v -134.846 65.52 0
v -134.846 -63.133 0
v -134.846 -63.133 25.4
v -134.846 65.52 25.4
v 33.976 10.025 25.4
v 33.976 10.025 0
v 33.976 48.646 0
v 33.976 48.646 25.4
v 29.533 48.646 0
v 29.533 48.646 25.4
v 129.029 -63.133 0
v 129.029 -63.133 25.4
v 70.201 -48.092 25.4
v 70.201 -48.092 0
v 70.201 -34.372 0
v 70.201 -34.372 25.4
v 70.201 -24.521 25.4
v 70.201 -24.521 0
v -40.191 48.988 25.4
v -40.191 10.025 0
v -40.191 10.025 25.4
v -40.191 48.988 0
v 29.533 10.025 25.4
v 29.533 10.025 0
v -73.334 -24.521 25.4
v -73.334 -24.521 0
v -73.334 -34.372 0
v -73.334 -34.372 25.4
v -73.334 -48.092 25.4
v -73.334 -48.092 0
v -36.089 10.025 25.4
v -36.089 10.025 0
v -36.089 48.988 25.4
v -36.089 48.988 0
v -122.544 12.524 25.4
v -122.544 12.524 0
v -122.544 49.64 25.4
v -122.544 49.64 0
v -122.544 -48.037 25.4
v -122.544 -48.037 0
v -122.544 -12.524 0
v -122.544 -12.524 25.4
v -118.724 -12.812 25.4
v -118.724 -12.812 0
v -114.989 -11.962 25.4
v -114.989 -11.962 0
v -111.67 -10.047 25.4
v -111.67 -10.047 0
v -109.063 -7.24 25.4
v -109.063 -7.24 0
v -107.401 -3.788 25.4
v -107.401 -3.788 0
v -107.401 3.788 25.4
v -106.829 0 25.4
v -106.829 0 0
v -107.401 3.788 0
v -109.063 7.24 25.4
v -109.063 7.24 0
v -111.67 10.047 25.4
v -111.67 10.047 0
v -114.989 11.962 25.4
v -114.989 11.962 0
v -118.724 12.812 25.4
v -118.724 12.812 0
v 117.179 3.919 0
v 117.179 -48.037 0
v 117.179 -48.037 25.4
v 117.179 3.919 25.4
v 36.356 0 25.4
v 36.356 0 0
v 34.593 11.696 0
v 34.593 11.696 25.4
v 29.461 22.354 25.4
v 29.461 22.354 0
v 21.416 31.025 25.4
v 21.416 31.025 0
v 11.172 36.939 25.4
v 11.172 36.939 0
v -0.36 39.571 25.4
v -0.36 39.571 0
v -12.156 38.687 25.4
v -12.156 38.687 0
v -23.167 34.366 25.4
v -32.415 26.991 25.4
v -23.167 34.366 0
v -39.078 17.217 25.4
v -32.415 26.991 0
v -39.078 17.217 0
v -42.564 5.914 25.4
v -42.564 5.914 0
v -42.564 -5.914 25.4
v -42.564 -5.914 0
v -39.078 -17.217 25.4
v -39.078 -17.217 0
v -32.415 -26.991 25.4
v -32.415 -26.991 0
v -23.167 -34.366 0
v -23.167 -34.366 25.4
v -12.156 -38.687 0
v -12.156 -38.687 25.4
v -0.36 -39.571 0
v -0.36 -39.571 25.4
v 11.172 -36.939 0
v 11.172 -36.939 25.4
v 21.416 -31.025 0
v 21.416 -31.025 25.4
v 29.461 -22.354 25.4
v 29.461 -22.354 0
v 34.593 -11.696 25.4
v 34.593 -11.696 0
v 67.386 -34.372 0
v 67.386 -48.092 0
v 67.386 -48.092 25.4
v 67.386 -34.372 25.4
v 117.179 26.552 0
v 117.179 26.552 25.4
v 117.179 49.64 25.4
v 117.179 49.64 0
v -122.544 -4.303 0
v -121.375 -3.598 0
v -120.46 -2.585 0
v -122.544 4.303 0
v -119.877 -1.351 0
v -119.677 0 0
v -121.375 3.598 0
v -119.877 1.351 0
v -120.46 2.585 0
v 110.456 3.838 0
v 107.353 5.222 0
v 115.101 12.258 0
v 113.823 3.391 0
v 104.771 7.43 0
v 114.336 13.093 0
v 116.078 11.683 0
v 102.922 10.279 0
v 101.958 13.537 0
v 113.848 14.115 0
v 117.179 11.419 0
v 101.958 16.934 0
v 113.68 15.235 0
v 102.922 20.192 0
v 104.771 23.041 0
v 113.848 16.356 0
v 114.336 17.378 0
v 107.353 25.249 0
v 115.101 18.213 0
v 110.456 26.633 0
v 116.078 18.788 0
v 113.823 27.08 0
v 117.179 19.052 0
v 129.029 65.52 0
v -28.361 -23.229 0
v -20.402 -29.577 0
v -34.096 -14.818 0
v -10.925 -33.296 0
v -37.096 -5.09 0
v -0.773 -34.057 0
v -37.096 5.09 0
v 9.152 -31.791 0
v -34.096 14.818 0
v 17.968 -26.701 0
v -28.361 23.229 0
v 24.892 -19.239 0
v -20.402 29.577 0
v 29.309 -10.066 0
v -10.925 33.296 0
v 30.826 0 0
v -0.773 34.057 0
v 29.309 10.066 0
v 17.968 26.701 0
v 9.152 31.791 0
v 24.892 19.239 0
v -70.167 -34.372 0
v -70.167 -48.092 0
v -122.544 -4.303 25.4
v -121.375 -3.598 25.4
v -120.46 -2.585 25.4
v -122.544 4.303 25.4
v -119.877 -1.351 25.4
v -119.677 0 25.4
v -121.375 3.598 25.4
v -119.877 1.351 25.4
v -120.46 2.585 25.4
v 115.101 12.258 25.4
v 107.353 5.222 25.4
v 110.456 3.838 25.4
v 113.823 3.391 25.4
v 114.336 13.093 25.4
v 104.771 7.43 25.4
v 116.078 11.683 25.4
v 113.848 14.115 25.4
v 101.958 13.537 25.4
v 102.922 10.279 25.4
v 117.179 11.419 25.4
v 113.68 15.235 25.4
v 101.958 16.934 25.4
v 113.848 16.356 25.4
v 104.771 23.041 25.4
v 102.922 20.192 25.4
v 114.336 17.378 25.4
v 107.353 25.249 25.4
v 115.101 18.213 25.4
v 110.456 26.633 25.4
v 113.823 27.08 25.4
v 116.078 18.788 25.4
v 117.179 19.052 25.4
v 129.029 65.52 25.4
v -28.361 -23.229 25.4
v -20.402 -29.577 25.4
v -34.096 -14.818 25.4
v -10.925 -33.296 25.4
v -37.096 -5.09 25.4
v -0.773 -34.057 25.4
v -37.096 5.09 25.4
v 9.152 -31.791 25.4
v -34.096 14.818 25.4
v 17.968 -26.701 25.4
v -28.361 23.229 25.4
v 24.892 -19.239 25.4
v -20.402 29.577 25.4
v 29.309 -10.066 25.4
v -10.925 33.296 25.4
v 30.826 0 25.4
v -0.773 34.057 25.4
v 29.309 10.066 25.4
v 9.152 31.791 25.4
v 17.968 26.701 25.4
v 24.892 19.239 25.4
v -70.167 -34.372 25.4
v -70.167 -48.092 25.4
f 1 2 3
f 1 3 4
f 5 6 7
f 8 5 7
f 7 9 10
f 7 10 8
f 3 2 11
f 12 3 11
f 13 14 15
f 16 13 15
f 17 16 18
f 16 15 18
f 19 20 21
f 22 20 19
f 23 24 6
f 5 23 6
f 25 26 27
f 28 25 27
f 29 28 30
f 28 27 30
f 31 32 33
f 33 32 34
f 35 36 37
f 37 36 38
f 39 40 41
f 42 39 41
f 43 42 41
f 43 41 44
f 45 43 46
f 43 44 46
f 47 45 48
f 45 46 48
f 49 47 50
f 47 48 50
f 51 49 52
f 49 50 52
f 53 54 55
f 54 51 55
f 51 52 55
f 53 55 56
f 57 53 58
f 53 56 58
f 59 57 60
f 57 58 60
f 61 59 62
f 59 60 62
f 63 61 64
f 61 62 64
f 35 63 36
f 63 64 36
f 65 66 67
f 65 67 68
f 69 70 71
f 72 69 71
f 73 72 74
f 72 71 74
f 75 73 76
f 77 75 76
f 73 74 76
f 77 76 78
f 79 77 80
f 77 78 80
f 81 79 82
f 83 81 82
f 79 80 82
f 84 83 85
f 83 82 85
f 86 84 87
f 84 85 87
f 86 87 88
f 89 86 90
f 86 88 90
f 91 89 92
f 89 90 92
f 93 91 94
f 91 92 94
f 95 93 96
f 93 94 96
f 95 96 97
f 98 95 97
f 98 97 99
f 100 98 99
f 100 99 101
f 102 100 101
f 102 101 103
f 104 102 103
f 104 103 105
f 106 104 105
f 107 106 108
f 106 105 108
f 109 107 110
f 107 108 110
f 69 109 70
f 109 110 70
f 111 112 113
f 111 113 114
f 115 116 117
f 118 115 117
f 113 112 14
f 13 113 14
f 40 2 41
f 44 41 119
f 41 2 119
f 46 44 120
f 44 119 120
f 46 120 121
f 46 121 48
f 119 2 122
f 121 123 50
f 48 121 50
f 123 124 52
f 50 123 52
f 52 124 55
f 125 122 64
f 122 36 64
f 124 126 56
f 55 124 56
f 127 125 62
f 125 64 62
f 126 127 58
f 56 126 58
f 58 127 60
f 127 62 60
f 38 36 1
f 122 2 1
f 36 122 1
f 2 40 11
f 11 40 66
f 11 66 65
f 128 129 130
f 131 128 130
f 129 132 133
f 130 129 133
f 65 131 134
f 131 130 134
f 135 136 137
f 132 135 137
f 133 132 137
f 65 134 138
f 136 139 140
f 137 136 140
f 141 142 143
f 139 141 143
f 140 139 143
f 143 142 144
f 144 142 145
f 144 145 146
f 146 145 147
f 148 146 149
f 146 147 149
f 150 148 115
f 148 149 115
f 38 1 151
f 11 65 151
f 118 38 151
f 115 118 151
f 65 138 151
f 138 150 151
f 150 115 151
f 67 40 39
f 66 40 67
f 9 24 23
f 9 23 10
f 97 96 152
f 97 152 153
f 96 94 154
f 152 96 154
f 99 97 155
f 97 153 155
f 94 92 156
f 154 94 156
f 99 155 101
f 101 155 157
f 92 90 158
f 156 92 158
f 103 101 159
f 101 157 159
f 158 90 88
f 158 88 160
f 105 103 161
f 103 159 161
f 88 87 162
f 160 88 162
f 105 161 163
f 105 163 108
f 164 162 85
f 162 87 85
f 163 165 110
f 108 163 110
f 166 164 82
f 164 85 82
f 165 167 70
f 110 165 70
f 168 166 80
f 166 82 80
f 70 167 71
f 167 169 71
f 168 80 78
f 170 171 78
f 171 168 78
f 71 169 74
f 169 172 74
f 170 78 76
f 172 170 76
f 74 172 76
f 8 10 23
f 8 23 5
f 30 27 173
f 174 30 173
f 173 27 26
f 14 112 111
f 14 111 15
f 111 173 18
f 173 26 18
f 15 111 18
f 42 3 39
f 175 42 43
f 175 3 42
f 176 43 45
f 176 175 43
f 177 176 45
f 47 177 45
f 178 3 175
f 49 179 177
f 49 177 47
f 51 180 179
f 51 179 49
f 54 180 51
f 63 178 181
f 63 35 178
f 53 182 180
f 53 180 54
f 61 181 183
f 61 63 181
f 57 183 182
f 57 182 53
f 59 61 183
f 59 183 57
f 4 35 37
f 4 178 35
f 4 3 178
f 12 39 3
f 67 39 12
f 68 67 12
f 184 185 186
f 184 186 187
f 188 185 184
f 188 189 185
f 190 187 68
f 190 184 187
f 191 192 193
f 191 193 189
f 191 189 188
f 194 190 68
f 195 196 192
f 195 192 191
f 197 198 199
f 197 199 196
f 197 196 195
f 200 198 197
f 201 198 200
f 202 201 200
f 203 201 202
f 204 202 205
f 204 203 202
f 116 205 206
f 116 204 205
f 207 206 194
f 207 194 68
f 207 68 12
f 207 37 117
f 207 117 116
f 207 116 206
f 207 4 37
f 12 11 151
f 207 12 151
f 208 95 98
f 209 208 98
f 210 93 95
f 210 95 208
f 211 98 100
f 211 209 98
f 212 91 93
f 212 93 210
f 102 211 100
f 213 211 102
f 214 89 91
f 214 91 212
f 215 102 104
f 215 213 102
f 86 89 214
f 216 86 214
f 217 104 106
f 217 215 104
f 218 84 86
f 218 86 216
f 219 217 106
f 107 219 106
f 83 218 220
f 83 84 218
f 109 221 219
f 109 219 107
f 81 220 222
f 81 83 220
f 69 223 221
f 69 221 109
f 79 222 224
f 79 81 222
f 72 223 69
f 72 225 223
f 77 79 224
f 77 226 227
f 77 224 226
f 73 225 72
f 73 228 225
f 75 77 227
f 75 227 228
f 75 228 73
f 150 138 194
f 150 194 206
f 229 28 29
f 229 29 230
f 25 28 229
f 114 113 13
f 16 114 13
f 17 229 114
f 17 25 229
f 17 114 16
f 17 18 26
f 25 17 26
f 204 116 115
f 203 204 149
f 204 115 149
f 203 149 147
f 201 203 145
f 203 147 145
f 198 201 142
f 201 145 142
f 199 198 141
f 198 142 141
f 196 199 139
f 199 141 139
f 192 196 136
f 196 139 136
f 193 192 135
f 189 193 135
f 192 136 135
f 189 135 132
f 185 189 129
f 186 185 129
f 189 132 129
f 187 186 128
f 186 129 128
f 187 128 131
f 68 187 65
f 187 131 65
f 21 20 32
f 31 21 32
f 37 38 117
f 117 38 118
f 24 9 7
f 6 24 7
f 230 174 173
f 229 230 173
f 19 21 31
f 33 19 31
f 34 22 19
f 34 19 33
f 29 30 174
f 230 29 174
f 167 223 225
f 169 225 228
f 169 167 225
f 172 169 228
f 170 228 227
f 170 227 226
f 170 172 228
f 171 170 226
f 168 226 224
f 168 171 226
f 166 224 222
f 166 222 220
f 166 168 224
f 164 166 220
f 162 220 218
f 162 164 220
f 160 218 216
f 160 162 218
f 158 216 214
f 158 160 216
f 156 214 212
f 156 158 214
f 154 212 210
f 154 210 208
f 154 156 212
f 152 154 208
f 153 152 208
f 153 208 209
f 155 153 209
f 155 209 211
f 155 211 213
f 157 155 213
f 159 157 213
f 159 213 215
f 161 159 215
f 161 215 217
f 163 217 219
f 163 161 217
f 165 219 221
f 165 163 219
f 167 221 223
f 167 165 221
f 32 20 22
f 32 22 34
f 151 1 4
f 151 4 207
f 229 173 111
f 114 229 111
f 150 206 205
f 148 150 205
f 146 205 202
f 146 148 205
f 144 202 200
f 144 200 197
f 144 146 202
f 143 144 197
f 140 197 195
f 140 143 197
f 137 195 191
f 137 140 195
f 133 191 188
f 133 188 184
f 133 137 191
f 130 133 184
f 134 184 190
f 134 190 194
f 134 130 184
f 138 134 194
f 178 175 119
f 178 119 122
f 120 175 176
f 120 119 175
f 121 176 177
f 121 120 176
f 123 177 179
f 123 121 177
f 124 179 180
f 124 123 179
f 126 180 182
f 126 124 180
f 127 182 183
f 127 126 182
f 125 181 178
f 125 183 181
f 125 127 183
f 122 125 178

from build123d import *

# Parameters (mm, degrees)
F0_W      = 263.8747543097
F0_H      = 128.652587533
F0_W_2    = 239.7237867117
F0_H_2    = 97.6777933538
F1_DEPTH  = 25.4
F2_R      = 12.8476625459
F2_R_2    = 4.6622157097
F3_DEPTH  = 25.4
F4_R      = 11.844977251
F4_R_2    = 3.8304403424
F5_DEPTH  = 25.4
F6_W      = 4.1014142334
F6_H      = 38.9634296298
F7_DEPTH  = 25.4
F6_W_2    = 4.4431947172
F6_H_2    = 38.6216454208
F8_R      = 39.6820036639
F8_R_2    = 34.1520486265
F9_DEPTH  = 25.4
F10_W     = 137.5536173582
F10_H     = 7.035991177
F10_W_2   = 3.1661912799
F10_H_2   = 13.7201808393
F10_W_3   = 2.8143897653
F10_H_3   = 2.8143953532
F11_DEPTH = 25.4


with BuildPart() as f1:
    # F0 (on Top) → F1 (new body)
    with BuildSketch(Plane.XY):
        with Locations((-2.9087588191, 1.1933147907)):
            Rectangle(F0_W, F0_H)
        with Locations((-2.6825889945, 0.8015874773)):
            Rectangle(F0_W_2, F0_H_2, mode=Mode.SUBTRACT)
    extrude(amount=F1_DEPTH)

    # F2 (on Top) → F3 (join)
    with BuildSketch(Plane.XY):
        with Locations((-119.6770742536, 0)):
            Circle(F2_R)
        with Locations((-124.3392899632, 0)):
            Circle(F2_R_2, mode=Mode.SUBTRACT)
    extrude(amount=F3_DEPTH)

    # F4 (on Top) → F5 (join)
    with BuildSketch(Plane.XY):
        with Locations((113.6802583933, 15.2354836464)):
            Circle(F4_R)
        with Locations((117.5106987357, 15.2354836464)):
            Circle(F4_R_2, mode=Mode.SUBTRACT)
    extrude(amount=F5_DEPTH)


with BuildPart() as f7:
    # F6 (on Top) → F7 (new body)
    with BuildSketch(Plane.XY):
        with Locations((-38.1400566548, 29.5064225793)):
            Rectangle(F6_W, F6_H)
    extrude(amount=F7_DEPTH)


with BuildPart() as f7b:
    # F6 (on Top) → F7, piece 2 (new body)
    with BuildSketch(Plane.XY):
        with Locations((31.7548643798, 29.3355304748)):
            Rectangle(F6_W_2, F6_H_2)
    extrude(amount=F7_DEPTH)


with BuildPart() as f9:
    # F8 (on Top) → F9 (new body)
    with BuildSketch(Plane.XY):
        with Locations((-3.325571306, 0)):
            Circle(F8_R)
        with Locations((-3.325571306, 0)):
            Circle(F8_R_2, mode=Mode.SUBTRACT)
    extrude(amount=F9_DEPTH)


with BuildPart() as f11:
    # F10 (on Top) → F11 (new body)
    with BuildSketch(Plane.XY):
        with Locations((-1.3906732202, -30.8535294607)):
            Rectangle(F10_W, F10_H)
        with Locations((-71.7505775392, -41.2316154689)):
            Rectangle(F10_W_2, F10_H_2)
        Polygon((-70.1674818993, -34.3715250492), (-70.1674818993, -27.3355338722), (-70.1674818993, -24.521138519), (-73.3336731791, -24.521138519), (-73.3336731791, -34.3715250492), align=None)
        with Locations((68.7933303416, -41.2316154689)):
            Rectangle(F10_W_3, F10_H_2)
        Polygon((67.3861354589, -24.521138519), (67.3861354589, -27.3355338722), (67.3861354589, -34.3715250492), (70.2005252242, -34.3715250492), (70.2005252242, -24.521138519), align=None)
        with Locations((-1.3906732202, -25.9283361956)):
            Rectangle(F10_W, F10_H_3)
    extrude(amount=F11_DEPTH)


solid = Compound([f1.part, f7.part, f7b.part, f9.part, f11.part])
